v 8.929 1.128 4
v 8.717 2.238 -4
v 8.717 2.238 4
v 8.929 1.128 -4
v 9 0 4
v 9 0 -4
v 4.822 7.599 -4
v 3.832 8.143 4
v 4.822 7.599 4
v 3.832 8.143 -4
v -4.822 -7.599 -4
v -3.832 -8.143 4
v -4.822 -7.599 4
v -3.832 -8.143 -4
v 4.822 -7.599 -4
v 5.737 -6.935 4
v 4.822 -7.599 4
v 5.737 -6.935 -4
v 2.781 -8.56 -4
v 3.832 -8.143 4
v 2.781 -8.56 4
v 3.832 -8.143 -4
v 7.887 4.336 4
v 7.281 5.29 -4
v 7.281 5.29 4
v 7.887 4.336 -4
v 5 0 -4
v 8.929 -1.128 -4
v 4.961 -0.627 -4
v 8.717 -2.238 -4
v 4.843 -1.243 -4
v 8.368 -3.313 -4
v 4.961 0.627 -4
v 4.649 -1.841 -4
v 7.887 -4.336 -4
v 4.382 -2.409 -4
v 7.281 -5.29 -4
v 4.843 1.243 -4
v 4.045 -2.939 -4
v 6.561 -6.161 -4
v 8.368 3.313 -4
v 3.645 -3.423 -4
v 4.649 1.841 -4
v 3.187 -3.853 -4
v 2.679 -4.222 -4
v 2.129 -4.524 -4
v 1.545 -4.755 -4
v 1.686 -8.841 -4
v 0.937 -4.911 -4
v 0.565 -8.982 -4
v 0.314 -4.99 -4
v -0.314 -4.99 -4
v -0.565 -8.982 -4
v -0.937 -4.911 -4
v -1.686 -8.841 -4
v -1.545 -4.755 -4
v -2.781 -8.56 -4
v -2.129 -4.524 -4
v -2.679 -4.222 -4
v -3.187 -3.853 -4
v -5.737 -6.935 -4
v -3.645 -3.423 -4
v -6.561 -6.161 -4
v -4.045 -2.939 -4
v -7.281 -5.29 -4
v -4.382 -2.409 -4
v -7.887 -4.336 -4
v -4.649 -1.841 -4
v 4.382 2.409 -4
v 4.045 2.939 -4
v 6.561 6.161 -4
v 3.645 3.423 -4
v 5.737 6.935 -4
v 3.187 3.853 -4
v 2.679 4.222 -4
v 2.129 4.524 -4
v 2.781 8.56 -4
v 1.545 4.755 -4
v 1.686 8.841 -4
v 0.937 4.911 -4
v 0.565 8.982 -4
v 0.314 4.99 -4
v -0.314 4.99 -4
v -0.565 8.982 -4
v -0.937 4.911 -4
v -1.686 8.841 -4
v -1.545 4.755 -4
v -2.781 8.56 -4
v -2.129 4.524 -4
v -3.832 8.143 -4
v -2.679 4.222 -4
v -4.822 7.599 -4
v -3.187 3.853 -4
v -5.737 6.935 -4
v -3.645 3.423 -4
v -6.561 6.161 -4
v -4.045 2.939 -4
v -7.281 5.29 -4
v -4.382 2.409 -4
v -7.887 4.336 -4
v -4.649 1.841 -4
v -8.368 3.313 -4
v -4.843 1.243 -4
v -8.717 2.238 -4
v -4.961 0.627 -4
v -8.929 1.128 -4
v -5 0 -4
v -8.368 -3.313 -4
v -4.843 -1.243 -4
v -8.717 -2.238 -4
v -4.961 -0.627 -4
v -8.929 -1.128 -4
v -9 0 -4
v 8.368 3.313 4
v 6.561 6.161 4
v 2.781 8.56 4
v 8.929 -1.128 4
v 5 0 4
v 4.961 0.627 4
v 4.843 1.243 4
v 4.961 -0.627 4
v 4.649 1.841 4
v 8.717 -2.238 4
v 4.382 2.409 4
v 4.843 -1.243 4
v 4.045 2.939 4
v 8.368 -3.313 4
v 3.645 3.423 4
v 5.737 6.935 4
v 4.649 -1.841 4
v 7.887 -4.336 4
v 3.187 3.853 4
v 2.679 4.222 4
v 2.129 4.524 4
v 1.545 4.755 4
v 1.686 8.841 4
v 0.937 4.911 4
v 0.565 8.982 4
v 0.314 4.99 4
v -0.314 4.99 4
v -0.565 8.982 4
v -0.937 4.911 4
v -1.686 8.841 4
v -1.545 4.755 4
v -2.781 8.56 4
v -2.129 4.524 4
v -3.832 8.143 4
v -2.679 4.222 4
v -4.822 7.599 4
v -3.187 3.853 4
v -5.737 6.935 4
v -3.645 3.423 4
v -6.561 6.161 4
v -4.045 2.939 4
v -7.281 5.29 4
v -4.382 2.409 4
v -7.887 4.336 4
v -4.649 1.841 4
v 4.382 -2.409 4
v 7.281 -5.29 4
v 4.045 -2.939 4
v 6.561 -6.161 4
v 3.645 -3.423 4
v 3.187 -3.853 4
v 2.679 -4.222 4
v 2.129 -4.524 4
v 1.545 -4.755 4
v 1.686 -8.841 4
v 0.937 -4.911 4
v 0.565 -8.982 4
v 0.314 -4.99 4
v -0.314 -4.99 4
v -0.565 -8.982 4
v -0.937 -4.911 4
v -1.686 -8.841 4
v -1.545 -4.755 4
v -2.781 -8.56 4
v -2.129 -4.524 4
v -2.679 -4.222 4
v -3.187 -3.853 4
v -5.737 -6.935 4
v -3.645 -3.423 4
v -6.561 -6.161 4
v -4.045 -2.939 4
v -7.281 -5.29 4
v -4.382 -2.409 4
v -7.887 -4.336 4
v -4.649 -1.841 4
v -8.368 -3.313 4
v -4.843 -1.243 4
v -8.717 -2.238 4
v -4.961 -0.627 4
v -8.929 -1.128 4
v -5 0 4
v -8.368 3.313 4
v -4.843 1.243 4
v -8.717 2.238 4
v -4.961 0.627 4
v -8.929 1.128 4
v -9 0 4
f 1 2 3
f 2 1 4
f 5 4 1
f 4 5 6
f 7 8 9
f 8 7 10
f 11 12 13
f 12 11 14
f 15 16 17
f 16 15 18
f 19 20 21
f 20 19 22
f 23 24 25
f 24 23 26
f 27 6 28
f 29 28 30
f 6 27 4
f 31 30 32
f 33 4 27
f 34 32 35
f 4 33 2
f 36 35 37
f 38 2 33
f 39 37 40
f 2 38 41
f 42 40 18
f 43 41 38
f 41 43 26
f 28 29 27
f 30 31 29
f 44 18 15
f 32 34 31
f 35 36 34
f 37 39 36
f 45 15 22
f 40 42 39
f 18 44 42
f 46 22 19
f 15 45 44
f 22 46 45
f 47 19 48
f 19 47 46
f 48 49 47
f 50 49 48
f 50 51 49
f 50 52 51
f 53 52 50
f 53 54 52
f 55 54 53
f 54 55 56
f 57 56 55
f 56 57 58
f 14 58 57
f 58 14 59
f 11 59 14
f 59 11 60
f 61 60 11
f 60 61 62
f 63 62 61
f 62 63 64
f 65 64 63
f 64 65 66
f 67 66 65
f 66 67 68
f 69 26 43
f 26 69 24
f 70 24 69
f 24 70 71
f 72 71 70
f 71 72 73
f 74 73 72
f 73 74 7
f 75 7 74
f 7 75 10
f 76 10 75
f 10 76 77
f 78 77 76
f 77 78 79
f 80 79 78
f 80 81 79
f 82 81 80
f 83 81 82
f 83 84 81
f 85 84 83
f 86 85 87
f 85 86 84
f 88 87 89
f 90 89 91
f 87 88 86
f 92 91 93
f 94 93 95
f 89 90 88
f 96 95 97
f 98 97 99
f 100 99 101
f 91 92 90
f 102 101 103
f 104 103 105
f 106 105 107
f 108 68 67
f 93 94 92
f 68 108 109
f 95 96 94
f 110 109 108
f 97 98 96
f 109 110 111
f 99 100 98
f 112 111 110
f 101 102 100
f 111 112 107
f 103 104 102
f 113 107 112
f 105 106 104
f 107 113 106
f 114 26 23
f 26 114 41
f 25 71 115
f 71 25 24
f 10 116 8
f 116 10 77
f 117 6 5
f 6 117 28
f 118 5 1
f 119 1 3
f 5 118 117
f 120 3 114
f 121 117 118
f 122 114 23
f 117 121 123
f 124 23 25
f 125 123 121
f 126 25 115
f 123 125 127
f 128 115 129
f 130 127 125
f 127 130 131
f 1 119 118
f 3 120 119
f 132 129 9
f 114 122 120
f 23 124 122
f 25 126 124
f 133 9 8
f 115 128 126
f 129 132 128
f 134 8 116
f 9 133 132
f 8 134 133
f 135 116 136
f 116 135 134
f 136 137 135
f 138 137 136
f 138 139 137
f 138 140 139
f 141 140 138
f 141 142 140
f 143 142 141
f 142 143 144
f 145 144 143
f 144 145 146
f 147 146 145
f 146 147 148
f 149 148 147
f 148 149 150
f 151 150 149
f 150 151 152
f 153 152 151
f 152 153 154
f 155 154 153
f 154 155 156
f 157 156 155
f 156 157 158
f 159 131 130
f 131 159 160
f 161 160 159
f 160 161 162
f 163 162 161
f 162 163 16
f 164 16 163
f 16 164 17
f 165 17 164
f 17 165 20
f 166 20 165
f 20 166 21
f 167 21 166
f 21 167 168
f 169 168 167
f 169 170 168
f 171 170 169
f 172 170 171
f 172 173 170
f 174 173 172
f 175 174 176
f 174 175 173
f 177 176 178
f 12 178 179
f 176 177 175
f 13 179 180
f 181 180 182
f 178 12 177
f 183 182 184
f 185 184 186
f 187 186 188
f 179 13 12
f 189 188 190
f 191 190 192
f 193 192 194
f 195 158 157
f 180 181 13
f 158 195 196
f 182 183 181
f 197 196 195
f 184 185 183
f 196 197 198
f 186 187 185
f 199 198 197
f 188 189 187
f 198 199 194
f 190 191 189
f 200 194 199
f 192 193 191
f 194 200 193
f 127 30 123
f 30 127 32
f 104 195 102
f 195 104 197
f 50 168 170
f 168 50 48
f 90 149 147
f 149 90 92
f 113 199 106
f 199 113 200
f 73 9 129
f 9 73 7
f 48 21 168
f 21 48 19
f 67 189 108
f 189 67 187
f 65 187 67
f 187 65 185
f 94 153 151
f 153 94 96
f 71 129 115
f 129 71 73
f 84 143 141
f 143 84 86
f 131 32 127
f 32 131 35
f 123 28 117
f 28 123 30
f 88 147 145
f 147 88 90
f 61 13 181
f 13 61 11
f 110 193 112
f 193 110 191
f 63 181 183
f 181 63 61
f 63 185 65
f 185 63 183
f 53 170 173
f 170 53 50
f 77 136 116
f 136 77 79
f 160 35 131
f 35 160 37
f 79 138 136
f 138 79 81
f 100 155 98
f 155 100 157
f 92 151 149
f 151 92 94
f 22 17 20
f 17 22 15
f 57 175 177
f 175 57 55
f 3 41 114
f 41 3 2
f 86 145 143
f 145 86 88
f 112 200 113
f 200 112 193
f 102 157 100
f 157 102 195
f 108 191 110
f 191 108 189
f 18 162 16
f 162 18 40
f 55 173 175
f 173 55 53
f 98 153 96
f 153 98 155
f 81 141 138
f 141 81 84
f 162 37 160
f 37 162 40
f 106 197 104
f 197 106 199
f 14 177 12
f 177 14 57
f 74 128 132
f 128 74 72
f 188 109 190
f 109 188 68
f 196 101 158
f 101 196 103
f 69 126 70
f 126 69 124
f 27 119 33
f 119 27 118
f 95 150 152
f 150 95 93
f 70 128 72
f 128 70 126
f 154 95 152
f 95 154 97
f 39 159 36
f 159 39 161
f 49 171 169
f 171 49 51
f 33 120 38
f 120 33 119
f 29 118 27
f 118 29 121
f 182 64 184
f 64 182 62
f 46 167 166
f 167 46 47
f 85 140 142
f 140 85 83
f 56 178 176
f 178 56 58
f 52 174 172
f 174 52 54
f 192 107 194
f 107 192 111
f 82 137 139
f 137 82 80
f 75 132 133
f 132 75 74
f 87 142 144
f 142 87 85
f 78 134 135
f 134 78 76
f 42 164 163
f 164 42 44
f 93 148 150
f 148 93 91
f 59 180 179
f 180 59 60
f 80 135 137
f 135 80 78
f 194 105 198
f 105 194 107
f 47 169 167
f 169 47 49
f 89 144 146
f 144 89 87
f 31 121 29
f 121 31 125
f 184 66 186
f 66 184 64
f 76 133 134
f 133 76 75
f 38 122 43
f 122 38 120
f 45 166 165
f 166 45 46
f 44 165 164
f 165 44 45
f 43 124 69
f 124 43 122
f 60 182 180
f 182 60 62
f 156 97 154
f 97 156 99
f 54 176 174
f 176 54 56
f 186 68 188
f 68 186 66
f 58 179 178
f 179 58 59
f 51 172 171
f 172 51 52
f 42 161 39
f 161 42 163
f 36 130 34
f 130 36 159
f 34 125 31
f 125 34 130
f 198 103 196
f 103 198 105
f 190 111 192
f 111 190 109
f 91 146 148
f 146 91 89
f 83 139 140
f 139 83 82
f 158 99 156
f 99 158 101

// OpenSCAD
$fn = 50;


difference() {
	union() {
		translate(v = [0, 0, -4.0000000000]) {
			cylinder(h = 8, r = 9.0000000000);
		}
	}
	union() {
		translate(v = [0, 0, -100.0000000000]) {
			cylinder(h = 200, r = 5.0000000000);
		}
	}
}
